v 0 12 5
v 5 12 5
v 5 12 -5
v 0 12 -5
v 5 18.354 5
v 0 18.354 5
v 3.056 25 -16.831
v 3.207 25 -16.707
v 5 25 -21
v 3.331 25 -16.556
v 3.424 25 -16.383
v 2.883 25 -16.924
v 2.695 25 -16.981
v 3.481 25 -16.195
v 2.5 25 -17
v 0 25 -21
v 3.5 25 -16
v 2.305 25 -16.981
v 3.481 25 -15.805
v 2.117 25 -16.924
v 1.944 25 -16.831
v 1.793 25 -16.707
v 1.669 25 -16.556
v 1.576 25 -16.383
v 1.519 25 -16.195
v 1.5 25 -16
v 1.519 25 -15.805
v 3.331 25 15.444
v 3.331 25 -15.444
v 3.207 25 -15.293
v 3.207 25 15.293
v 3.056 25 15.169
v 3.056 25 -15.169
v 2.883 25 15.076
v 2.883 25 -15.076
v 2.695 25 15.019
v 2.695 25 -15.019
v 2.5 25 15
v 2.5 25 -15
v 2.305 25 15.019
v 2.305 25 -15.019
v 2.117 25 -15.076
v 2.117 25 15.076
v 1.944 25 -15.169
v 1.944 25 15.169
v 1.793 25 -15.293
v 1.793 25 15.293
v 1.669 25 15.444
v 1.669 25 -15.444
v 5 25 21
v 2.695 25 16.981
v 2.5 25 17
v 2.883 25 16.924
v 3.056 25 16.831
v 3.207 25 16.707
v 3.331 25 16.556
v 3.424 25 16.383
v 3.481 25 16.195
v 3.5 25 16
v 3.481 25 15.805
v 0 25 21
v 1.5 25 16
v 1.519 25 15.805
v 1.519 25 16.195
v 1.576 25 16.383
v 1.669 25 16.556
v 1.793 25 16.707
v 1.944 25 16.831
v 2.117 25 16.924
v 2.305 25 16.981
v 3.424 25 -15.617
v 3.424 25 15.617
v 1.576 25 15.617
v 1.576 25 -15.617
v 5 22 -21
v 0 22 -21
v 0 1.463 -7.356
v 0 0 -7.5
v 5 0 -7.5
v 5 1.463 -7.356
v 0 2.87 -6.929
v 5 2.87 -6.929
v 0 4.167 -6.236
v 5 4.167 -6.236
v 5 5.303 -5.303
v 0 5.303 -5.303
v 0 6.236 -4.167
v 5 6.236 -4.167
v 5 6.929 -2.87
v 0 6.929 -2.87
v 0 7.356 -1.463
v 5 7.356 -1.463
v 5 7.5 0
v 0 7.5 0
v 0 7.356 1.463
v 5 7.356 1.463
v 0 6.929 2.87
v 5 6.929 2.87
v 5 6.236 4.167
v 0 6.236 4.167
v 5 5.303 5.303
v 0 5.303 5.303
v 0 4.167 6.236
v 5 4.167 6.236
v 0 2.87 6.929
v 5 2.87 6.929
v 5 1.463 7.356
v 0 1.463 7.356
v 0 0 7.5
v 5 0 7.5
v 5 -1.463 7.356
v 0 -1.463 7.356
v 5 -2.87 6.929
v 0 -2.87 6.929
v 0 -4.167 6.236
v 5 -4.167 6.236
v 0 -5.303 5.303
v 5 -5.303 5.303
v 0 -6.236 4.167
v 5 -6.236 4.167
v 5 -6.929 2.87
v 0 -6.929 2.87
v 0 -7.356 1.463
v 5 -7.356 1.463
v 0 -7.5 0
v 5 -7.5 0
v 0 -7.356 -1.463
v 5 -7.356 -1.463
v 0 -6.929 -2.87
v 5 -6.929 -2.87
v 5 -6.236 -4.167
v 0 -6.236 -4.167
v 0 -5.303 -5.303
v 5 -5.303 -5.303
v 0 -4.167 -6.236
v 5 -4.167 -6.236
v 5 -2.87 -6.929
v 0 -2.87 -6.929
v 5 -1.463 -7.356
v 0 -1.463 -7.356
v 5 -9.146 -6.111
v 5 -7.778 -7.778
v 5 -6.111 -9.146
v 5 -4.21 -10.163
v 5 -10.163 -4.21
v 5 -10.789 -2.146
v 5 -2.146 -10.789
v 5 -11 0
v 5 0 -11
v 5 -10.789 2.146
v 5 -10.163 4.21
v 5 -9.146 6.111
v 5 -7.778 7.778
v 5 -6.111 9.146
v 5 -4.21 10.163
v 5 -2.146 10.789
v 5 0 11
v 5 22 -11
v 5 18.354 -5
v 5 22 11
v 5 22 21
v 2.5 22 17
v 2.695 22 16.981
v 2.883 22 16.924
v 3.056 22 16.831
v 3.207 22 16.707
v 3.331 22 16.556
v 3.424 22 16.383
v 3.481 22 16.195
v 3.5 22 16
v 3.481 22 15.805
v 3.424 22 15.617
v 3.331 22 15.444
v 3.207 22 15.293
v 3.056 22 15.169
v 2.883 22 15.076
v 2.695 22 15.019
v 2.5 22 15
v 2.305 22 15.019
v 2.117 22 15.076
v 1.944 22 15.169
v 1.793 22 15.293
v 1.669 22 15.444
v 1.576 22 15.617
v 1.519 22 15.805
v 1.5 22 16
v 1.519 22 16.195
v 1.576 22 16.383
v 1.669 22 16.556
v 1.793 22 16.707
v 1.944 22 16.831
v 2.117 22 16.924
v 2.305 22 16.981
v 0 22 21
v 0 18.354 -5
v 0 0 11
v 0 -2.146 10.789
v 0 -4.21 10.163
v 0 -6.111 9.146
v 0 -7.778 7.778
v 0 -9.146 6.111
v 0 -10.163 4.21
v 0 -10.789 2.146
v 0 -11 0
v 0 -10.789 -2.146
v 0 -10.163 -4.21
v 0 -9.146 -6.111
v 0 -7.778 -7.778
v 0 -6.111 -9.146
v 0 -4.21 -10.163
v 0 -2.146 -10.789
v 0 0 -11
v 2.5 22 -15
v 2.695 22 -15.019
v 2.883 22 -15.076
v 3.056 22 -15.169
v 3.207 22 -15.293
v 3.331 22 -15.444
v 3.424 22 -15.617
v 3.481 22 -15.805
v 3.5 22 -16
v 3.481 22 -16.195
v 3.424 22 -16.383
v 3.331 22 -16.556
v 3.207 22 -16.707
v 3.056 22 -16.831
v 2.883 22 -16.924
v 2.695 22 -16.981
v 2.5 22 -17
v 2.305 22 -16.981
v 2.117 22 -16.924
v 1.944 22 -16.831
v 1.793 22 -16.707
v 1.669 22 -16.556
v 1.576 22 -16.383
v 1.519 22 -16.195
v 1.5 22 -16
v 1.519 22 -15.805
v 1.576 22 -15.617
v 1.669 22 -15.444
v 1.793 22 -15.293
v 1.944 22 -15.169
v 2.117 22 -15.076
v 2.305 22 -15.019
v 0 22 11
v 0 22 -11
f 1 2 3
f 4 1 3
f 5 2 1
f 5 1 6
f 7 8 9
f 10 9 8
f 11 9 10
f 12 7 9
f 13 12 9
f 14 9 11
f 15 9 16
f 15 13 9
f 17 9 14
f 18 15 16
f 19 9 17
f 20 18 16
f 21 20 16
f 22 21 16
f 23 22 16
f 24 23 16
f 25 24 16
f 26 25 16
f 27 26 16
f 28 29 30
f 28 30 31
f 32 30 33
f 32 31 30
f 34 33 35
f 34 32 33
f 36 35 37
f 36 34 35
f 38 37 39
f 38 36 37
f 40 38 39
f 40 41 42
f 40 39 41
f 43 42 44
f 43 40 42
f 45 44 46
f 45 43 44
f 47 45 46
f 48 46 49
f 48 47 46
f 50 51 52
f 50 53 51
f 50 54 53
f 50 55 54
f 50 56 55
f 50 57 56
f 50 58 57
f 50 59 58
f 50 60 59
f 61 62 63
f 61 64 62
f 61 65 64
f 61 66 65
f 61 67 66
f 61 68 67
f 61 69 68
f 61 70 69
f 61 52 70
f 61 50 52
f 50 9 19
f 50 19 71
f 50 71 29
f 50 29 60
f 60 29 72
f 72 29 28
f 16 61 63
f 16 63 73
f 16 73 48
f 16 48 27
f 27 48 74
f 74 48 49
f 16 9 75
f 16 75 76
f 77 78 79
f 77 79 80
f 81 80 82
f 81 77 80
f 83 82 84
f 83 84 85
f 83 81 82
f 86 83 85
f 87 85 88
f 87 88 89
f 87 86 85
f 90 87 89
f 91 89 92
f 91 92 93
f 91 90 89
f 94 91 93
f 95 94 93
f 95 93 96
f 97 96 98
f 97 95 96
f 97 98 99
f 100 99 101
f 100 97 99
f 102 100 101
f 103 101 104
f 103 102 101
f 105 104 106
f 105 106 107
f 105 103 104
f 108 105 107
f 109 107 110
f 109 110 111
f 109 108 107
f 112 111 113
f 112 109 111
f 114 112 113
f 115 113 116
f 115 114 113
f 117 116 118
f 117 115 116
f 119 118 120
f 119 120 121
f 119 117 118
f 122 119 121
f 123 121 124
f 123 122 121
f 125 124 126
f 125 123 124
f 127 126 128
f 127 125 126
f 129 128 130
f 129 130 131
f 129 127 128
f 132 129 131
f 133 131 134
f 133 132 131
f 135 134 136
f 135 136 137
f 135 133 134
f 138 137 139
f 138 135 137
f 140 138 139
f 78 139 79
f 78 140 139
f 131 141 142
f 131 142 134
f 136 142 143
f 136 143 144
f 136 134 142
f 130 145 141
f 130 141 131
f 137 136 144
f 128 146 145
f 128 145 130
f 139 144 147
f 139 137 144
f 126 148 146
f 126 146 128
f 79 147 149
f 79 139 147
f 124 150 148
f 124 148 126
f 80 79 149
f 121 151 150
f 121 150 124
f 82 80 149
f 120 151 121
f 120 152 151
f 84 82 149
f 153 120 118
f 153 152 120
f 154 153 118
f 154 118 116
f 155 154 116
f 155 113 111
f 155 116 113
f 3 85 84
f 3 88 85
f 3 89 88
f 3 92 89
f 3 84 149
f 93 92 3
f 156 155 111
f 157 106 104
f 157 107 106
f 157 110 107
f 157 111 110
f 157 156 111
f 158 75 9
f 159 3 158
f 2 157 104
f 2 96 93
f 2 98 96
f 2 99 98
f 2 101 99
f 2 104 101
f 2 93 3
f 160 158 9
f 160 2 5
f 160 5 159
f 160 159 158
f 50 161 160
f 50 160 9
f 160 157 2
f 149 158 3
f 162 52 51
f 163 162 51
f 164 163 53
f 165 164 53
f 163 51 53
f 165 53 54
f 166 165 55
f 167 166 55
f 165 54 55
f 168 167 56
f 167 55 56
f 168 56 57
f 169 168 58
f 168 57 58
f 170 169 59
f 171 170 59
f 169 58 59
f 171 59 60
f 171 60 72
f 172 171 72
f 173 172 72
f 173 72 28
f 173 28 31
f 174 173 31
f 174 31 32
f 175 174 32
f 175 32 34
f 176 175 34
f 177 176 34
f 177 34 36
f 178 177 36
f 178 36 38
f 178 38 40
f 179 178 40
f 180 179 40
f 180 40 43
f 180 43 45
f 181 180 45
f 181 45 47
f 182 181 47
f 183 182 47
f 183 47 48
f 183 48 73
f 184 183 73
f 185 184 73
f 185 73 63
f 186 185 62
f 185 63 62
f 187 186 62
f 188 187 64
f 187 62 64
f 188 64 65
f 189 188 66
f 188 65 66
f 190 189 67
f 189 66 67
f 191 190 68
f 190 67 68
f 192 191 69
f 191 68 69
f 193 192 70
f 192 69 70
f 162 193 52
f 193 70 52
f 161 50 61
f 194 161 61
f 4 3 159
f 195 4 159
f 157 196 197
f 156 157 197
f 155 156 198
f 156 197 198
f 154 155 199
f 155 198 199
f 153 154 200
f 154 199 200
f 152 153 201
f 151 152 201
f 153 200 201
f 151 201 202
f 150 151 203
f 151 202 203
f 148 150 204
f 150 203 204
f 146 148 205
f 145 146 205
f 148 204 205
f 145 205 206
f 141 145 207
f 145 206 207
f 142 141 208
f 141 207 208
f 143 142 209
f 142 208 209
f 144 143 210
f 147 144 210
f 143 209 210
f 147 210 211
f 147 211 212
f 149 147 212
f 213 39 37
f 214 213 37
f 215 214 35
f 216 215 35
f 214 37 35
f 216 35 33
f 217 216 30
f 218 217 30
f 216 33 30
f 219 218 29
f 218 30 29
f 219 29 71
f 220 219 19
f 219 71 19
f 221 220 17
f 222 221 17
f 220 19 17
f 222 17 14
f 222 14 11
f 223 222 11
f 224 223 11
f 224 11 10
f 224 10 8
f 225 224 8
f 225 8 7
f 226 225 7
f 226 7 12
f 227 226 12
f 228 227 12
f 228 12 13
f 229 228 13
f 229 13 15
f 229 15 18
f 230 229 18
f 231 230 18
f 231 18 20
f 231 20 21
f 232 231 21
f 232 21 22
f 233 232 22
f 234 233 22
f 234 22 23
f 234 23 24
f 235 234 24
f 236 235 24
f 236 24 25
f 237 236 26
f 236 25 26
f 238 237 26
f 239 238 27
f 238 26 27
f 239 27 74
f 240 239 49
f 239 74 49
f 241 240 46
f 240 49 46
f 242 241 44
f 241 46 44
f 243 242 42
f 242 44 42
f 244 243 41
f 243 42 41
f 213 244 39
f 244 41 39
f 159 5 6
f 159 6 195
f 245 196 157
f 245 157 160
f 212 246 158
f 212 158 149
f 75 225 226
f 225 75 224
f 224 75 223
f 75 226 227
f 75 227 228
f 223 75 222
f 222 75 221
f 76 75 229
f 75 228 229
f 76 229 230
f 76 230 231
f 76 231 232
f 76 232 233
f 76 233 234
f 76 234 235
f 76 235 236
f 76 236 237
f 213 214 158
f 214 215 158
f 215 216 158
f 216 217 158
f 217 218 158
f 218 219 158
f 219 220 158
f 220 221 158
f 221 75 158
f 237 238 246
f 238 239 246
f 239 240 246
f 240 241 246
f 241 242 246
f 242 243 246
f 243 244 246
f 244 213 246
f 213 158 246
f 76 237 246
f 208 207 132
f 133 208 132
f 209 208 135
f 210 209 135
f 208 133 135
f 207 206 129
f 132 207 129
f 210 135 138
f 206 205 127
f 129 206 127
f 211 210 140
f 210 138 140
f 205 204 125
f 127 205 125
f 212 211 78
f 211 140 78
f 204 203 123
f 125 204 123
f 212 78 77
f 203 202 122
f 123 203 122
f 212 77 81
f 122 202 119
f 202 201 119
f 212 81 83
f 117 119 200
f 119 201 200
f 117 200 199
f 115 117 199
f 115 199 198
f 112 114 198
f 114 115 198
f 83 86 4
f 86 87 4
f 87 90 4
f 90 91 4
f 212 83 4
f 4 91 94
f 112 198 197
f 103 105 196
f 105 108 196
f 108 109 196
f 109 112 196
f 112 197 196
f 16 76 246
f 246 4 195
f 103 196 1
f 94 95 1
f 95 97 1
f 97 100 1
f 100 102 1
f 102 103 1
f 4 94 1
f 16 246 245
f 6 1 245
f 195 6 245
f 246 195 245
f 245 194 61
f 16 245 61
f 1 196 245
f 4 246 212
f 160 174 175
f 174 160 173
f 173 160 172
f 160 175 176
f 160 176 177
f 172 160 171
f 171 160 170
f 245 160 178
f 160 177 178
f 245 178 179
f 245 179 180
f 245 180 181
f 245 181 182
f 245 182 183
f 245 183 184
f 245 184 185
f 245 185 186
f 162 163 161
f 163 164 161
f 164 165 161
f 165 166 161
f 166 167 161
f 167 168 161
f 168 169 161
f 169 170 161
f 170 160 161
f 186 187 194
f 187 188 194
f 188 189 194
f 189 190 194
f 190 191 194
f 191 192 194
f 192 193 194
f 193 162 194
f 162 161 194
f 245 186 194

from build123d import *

# Parameters (mm, degrees)
SKETCH1_R           = 11
SKETCH1_R_2         = 7.5
EXTRUDE_THIN1_DEPTH = 5
BOSS_EXTRUDE2_DEPTH = 5
SKETCH4_W           = 5
SKETCH4_H           = 3
BOSS_EXTRUDE3_DEPTH = 10
SKETCH5_R           = 1
CUT_EXTRUDE1_DEPTH  = 5
LPATTERN1_COUNT     = 2
LPATTERN1_PITCH     = 32
SKETCH6_W           = 10
SKETCH6_H           = 6.354024863
CUT_EXTRUDE2_DEPTH  = 5


with BuildPart() as part:
    # Sketch1 → Extrude-Thin1 (new body)
    with BuildSketch(Plane(origin=(0, 0, 0), x_dir=(0, 0, -1), z_dir=(1, 0, 0))):
        Circle(SKETCH1_R)
        Circle(SKETCH1_R_2, mode=Mode.SUBTRACT)
    extrude(amount=EXTRUDE_THIN1_DEPTH)

    # Sketch2 → Boss-Extrude2 (add)
    with BuildSketch(Plane(origin=(0, 0, 0), x_dir=(0, 0, -1), z_dir=(1, 0, 0))):
        with BuildLine():
            Line((-11, 0), (-11, 25))
            Line((-11, 25), (11, 25))
            Line((11, 25), (11, 0))
            ThreePointArc((11, 0), (0, 11), (-11, 0))
        make_face()
    extrude(amount=BOSS_EXTRUDE2_DEPTH)

    # Sketch4 → Boss-Extrude3 (add)
    with BuildSketch(Plane(origin=(0, 0, -11), x_dir=(-1, 0, 0), z_dir=(0, 0, -1))):
        with Locations((-2.5, 23.5)):
            Rectangle(SKETCH4_W, SKETCH4_H)
    boss_extrude3 = extrude(amount=BOSS_EXTRUDE3_DEPTH)

    # Sketch5 → Cut-Extrude1 (cut)
    with BuildSketch(Plane(origin=(0, 25, 0), x_dir=(1, 0, 0), z_dir=(0, 1, 0))):
        with Locations(Location((2.5, 16, 0), (0, 0, 270))):
            Circle(SKETCH5_R)
    cut_extrude1 = extrude(amount=-CUT_EXTRUDE1_DEPTH, mode=Mode.SUBTRACT)

    # LPattern1: Boss-Extrude3, Cut-Extrude1 ×2
    with Locations(*[(0, 0, i * LPATTERN1_PITCH) for i in range(1, LPATTERN1_COUNT)]):
        add(boss_extrude3)
        add(cut_extrude1, mode=Mode.SUBTRACT)

    # Sketch6 → Cut-Extrude2 (cut)
    with BuildSketch(Plane(origin=(5, 0, 0), x_dir=(0, 0, -1), z_dir=(1, 0, 0))):
        with Locations((0, 15.177012432)):
            Rectangle(SKETCH6_W, SKETCH6_H)
    extrude(amount=-CUT_EXTRUDE2_DEPTH, mode=Mode.SUBTRACT)


solid = part.part
